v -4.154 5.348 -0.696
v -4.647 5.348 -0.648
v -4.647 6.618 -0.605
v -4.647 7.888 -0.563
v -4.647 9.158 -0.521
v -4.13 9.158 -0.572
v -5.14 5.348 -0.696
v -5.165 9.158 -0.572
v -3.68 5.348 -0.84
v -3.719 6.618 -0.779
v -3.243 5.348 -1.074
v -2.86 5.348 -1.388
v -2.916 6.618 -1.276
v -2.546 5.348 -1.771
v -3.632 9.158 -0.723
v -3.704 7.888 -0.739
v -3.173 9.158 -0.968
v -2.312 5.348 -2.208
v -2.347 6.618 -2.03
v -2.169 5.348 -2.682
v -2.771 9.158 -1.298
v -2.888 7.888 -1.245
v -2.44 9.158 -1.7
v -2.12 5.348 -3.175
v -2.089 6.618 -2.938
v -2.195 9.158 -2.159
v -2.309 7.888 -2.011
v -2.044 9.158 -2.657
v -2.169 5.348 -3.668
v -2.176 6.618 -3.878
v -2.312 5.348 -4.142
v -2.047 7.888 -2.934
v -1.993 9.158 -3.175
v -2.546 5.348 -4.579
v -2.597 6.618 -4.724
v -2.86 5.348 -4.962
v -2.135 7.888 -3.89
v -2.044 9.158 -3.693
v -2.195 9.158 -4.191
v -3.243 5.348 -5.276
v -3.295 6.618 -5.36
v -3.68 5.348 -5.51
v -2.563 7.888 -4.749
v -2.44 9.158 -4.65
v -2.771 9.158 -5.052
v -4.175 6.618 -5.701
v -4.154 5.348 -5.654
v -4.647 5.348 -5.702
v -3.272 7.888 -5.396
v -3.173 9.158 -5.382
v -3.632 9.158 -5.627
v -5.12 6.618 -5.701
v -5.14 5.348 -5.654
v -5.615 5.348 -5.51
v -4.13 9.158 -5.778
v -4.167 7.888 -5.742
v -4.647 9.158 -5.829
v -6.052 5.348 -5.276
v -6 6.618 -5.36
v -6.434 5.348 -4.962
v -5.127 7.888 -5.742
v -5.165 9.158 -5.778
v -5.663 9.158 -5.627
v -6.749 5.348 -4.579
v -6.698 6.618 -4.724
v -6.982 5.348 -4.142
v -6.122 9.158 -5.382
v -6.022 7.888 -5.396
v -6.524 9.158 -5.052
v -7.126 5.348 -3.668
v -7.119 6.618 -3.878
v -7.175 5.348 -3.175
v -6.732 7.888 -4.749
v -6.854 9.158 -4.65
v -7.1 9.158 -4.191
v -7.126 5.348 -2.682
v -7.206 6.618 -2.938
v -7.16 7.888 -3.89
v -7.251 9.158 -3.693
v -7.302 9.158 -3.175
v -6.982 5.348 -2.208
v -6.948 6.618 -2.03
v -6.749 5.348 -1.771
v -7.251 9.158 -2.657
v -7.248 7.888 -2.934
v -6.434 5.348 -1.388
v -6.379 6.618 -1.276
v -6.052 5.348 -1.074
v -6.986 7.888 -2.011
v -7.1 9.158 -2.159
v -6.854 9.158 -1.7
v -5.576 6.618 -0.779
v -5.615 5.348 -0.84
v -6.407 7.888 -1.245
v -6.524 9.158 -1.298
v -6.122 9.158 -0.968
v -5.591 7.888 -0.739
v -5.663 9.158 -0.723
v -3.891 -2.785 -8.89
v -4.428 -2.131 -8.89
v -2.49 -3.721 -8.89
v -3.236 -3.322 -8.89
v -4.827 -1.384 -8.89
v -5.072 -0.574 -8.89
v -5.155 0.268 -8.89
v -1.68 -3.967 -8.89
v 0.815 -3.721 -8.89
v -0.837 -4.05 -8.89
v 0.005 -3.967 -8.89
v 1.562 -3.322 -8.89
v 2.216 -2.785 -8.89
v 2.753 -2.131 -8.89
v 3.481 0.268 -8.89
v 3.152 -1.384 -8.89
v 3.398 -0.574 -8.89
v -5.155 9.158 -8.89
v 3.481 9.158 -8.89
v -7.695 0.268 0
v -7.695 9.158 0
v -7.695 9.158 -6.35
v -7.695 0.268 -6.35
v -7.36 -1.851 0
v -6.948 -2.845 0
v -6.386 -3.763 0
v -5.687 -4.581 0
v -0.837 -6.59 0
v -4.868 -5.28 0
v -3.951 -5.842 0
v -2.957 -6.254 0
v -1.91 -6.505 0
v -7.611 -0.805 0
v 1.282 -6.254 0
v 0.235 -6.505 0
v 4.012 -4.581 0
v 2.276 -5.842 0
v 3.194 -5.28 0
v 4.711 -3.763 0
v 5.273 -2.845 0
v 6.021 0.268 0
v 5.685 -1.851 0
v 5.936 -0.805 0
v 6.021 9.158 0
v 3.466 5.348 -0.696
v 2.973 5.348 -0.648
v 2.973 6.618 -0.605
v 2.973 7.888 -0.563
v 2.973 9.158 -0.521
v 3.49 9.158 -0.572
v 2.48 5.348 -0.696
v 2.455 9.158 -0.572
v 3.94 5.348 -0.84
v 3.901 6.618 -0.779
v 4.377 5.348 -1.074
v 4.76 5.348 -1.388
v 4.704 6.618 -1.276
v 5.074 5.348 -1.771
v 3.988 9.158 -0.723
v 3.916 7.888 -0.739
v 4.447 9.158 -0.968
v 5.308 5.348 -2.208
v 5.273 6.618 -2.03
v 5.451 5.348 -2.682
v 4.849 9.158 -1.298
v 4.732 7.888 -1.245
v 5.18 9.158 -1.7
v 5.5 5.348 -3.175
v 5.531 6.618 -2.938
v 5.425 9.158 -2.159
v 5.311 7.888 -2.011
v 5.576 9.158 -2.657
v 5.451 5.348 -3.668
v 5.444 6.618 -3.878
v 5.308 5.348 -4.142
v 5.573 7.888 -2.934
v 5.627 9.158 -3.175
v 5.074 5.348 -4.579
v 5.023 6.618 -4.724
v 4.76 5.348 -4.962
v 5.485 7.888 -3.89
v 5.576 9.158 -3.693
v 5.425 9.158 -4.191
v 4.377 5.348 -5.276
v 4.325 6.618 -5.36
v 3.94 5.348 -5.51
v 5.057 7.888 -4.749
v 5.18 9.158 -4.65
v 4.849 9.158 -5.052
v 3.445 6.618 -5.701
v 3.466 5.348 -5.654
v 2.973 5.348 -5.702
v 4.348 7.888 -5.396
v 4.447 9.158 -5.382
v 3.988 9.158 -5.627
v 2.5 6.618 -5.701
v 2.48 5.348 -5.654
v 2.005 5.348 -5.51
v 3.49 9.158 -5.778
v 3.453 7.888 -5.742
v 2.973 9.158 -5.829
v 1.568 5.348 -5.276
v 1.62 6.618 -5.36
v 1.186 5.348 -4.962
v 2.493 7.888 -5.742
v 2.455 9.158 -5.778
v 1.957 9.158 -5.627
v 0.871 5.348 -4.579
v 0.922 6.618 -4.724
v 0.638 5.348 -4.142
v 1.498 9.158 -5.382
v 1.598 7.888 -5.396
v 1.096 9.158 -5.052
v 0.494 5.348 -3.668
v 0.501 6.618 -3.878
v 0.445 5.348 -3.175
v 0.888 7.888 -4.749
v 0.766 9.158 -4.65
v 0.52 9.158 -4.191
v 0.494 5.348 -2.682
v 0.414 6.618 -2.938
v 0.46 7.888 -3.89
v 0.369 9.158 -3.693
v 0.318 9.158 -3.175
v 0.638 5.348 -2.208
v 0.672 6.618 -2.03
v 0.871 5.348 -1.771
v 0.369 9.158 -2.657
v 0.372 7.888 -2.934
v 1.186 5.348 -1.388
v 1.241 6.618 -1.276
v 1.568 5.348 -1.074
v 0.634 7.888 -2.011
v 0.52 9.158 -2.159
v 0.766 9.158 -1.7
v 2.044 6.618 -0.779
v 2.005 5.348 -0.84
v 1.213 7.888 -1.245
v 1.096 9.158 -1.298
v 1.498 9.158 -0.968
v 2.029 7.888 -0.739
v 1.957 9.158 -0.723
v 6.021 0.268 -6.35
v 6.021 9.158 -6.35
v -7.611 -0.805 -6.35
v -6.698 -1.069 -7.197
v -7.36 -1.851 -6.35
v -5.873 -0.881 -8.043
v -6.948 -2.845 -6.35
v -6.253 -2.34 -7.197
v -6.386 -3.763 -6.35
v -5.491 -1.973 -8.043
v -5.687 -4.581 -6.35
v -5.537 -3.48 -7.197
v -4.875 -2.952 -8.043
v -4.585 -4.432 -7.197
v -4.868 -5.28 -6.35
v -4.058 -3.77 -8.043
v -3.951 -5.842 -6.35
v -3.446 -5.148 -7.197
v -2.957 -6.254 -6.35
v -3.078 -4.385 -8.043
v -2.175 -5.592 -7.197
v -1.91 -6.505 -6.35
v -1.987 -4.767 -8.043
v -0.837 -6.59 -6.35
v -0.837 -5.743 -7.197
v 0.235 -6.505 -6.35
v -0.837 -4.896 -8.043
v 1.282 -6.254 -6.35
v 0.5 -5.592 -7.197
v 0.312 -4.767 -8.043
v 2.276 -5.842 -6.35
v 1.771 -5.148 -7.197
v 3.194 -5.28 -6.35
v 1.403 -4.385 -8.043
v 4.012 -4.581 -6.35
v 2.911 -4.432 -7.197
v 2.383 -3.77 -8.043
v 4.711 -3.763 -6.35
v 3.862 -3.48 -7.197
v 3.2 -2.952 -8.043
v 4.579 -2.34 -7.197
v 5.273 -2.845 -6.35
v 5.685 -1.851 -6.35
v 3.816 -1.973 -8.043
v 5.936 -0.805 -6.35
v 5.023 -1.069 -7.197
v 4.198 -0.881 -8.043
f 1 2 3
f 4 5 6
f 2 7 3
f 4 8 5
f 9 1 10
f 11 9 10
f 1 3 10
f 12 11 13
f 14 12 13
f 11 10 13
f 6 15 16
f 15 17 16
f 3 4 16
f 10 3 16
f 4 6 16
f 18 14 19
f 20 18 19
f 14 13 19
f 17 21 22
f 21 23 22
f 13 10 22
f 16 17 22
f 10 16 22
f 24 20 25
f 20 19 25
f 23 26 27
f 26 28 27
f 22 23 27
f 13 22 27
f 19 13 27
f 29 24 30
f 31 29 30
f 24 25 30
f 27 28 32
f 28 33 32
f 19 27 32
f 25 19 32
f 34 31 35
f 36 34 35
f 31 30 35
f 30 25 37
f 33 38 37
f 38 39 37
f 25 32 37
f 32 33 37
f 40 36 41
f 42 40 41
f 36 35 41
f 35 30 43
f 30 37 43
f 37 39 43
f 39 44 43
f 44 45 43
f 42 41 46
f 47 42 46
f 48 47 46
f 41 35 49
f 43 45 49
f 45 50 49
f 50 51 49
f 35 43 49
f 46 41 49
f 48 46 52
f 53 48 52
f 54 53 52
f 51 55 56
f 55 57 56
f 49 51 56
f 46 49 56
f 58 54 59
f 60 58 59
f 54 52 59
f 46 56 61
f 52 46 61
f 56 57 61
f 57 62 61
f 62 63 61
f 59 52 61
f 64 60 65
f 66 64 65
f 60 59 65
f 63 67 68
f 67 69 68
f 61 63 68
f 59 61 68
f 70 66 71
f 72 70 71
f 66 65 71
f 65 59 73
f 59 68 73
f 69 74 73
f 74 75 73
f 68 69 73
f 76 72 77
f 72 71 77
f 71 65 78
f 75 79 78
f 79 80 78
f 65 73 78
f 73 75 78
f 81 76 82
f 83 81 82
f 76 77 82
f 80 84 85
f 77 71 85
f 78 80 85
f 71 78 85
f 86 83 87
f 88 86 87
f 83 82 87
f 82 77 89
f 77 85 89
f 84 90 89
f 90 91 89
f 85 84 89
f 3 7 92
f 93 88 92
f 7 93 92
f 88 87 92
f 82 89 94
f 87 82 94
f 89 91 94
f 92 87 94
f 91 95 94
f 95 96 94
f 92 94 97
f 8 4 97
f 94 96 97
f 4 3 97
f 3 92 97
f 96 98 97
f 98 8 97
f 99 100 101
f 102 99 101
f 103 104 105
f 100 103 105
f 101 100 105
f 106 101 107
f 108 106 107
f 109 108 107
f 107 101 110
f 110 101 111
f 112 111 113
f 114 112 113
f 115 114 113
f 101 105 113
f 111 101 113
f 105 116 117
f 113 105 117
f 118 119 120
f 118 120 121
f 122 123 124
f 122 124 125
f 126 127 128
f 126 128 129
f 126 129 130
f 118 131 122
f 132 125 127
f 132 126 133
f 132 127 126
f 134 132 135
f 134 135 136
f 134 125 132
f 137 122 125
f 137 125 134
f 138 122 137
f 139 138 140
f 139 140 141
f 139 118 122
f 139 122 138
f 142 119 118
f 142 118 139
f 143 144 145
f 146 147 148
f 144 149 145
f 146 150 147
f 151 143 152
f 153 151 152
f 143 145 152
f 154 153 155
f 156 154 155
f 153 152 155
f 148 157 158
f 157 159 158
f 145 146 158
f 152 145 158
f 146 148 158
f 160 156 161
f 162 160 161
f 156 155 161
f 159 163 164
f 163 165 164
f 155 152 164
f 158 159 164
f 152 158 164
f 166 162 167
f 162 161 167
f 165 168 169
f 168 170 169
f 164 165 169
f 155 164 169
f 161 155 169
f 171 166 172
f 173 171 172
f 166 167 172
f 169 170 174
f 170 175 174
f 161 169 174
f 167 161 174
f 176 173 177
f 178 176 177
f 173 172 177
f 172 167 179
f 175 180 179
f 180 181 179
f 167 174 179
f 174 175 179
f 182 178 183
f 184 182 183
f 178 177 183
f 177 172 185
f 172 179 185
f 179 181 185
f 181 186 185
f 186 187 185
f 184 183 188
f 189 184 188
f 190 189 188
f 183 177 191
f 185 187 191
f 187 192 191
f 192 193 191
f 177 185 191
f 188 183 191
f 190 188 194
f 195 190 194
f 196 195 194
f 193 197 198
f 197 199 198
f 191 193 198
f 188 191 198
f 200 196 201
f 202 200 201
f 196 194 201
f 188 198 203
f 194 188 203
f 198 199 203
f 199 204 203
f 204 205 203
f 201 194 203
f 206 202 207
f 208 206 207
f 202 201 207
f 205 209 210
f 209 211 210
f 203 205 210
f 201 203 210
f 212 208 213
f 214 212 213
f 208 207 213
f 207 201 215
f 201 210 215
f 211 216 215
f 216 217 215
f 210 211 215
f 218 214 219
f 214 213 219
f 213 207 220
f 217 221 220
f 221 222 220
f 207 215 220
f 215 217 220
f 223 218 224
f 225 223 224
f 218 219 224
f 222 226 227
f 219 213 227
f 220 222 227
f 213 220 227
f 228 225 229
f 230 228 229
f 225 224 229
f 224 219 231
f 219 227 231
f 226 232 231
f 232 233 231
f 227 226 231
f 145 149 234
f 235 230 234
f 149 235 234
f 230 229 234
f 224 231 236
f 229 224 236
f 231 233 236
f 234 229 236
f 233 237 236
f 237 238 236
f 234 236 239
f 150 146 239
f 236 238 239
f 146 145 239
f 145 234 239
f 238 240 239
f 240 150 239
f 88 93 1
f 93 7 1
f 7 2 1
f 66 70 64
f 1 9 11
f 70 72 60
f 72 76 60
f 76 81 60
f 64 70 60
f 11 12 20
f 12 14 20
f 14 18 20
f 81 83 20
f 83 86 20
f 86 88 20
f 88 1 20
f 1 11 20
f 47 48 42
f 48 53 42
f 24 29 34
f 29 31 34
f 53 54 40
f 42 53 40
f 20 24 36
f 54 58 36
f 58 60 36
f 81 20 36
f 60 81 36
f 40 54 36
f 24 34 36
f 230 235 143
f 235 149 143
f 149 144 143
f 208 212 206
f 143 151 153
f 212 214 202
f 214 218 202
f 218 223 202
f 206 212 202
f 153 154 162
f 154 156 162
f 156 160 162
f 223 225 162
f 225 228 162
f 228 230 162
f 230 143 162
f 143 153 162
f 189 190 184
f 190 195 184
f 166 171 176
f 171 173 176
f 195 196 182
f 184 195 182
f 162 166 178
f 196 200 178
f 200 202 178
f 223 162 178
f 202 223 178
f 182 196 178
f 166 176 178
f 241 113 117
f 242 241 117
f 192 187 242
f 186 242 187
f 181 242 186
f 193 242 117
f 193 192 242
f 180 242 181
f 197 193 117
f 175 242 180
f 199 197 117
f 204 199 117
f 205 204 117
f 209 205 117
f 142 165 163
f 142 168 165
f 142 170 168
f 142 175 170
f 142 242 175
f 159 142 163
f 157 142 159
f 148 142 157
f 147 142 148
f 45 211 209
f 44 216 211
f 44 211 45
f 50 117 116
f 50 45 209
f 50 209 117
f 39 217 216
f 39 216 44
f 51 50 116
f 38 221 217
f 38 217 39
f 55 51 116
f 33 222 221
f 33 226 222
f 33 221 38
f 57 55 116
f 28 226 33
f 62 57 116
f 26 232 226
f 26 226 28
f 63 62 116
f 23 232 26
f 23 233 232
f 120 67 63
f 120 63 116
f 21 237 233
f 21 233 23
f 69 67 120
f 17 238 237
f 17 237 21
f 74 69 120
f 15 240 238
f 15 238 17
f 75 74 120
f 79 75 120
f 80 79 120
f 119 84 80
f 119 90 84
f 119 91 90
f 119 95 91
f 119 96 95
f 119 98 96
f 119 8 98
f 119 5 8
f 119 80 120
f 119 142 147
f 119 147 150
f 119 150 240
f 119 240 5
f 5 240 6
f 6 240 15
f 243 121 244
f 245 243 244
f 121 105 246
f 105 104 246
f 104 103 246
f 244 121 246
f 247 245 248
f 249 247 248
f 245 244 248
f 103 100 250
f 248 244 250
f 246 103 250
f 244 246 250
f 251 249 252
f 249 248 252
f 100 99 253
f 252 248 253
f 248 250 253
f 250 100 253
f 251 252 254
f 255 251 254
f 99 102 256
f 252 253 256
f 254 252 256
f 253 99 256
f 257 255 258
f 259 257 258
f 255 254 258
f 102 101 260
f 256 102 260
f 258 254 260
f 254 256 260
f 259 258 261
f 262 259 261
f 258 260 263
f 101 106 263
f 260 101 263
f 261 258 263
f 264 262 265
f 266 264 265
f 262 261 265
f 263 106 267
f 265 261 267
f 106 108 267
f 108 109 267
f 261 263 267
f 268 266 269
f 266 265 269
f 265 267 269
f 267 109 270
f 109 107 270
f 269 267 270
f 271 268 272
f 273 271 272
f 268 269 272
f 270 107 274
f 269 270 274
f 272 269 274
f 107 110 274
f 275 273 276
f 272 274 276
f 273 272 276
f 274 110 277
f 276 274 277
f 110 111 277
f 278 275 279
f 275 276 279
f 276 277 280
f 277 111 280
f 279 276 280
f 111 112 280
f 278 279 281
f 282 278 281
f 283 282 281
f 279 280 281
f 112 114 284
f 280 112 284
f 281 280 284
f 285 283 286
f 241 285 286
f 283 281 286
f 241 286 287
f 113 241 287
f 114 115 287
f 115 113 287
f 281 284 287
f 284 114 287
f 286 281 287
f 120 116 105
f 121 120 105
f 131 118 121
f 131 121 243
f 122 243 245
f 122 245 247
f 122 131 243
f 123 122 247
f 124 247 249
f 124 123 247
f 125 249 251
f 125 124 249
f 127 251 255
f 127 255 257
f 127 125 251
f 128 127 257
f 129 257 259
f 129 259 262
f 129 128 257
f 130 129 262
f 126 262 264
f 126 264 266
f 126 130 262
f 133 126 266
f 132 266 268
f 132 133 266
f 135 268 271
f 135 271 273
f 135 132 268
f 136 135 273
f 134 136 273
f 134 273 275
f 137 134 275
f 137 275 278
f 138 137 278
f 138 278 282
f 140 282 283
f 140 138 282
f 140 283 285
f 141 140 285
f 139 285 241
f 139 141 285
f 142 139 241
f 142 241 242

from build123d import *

# Parameters (mm, degrees)
BOSS_EXTRUDE1_DEPTH = 8.89
CHAMFER1_SIZE       = 2.54
HOLE1_AT_2_COUNT    = 2
HOLE1_AT_2_PITCH    = 7.62


with BuildPart() as part:
    # Sketch1 → Boss-Extrude1 (new body)
    with BuildSketch(Plane.XY):
        with BuildLine():
            Line((6.020580432, 9.158318359), (-7.695419568, 9.158318359))
            Line((-7.695419568, 9.158318359), (-7.695419568, 0.268318359))
            ThreePointArc((-7.695419568, 0.268318359), (-0.837419568, -6.589681641), (6.020580432, 0.268318359))
            Line((6.020580432, 0.268318359), (6.020580432, 9.158318359))
        make_face()
    extrude(amount=-BOSS_EXTRUDE1_DEPTH)

    # Chamfer1
    chamfer1_edges = [part.edges().sort_by_distance(p)[0] for p in [
        (-0.837419568, -6.589681641, -8.89),
        (6.020580432, 4.713318359, -8.89),
        (-7.695419568, 4.713318359, -8.89),
    ]]
    chamfer(chamfer1_edges, length=CHAMFER1_SIZE)

    # Sketch3 → Hole1 (revolve, cut)
    with BuildSketch(Plane(origin=(2.972580432, 9.158318359, -3.175), x_dir=(0, 0, 1), z_dir=(1, 0, 0))):
        Polygon((0, 0), (0, 3.81), (2.5273, 3.81), (2.6543, 0), align=None)
    hole1 = revolve(axis=Axis((2.972580432, -100.841681641, -3.175), (0, 1, 0)), mode=Mode.SUBTRACT)

    # Hole1 at 2: Hole1 ×2
    with Locations(*[(-i * HOLE1_AT_2_PITCH, 0, 0) for i in range(1, HOLE1_AT_2_COUNT)]):
        add(hole1, mode=Mode.SUBTRACT)


solid = part.part
